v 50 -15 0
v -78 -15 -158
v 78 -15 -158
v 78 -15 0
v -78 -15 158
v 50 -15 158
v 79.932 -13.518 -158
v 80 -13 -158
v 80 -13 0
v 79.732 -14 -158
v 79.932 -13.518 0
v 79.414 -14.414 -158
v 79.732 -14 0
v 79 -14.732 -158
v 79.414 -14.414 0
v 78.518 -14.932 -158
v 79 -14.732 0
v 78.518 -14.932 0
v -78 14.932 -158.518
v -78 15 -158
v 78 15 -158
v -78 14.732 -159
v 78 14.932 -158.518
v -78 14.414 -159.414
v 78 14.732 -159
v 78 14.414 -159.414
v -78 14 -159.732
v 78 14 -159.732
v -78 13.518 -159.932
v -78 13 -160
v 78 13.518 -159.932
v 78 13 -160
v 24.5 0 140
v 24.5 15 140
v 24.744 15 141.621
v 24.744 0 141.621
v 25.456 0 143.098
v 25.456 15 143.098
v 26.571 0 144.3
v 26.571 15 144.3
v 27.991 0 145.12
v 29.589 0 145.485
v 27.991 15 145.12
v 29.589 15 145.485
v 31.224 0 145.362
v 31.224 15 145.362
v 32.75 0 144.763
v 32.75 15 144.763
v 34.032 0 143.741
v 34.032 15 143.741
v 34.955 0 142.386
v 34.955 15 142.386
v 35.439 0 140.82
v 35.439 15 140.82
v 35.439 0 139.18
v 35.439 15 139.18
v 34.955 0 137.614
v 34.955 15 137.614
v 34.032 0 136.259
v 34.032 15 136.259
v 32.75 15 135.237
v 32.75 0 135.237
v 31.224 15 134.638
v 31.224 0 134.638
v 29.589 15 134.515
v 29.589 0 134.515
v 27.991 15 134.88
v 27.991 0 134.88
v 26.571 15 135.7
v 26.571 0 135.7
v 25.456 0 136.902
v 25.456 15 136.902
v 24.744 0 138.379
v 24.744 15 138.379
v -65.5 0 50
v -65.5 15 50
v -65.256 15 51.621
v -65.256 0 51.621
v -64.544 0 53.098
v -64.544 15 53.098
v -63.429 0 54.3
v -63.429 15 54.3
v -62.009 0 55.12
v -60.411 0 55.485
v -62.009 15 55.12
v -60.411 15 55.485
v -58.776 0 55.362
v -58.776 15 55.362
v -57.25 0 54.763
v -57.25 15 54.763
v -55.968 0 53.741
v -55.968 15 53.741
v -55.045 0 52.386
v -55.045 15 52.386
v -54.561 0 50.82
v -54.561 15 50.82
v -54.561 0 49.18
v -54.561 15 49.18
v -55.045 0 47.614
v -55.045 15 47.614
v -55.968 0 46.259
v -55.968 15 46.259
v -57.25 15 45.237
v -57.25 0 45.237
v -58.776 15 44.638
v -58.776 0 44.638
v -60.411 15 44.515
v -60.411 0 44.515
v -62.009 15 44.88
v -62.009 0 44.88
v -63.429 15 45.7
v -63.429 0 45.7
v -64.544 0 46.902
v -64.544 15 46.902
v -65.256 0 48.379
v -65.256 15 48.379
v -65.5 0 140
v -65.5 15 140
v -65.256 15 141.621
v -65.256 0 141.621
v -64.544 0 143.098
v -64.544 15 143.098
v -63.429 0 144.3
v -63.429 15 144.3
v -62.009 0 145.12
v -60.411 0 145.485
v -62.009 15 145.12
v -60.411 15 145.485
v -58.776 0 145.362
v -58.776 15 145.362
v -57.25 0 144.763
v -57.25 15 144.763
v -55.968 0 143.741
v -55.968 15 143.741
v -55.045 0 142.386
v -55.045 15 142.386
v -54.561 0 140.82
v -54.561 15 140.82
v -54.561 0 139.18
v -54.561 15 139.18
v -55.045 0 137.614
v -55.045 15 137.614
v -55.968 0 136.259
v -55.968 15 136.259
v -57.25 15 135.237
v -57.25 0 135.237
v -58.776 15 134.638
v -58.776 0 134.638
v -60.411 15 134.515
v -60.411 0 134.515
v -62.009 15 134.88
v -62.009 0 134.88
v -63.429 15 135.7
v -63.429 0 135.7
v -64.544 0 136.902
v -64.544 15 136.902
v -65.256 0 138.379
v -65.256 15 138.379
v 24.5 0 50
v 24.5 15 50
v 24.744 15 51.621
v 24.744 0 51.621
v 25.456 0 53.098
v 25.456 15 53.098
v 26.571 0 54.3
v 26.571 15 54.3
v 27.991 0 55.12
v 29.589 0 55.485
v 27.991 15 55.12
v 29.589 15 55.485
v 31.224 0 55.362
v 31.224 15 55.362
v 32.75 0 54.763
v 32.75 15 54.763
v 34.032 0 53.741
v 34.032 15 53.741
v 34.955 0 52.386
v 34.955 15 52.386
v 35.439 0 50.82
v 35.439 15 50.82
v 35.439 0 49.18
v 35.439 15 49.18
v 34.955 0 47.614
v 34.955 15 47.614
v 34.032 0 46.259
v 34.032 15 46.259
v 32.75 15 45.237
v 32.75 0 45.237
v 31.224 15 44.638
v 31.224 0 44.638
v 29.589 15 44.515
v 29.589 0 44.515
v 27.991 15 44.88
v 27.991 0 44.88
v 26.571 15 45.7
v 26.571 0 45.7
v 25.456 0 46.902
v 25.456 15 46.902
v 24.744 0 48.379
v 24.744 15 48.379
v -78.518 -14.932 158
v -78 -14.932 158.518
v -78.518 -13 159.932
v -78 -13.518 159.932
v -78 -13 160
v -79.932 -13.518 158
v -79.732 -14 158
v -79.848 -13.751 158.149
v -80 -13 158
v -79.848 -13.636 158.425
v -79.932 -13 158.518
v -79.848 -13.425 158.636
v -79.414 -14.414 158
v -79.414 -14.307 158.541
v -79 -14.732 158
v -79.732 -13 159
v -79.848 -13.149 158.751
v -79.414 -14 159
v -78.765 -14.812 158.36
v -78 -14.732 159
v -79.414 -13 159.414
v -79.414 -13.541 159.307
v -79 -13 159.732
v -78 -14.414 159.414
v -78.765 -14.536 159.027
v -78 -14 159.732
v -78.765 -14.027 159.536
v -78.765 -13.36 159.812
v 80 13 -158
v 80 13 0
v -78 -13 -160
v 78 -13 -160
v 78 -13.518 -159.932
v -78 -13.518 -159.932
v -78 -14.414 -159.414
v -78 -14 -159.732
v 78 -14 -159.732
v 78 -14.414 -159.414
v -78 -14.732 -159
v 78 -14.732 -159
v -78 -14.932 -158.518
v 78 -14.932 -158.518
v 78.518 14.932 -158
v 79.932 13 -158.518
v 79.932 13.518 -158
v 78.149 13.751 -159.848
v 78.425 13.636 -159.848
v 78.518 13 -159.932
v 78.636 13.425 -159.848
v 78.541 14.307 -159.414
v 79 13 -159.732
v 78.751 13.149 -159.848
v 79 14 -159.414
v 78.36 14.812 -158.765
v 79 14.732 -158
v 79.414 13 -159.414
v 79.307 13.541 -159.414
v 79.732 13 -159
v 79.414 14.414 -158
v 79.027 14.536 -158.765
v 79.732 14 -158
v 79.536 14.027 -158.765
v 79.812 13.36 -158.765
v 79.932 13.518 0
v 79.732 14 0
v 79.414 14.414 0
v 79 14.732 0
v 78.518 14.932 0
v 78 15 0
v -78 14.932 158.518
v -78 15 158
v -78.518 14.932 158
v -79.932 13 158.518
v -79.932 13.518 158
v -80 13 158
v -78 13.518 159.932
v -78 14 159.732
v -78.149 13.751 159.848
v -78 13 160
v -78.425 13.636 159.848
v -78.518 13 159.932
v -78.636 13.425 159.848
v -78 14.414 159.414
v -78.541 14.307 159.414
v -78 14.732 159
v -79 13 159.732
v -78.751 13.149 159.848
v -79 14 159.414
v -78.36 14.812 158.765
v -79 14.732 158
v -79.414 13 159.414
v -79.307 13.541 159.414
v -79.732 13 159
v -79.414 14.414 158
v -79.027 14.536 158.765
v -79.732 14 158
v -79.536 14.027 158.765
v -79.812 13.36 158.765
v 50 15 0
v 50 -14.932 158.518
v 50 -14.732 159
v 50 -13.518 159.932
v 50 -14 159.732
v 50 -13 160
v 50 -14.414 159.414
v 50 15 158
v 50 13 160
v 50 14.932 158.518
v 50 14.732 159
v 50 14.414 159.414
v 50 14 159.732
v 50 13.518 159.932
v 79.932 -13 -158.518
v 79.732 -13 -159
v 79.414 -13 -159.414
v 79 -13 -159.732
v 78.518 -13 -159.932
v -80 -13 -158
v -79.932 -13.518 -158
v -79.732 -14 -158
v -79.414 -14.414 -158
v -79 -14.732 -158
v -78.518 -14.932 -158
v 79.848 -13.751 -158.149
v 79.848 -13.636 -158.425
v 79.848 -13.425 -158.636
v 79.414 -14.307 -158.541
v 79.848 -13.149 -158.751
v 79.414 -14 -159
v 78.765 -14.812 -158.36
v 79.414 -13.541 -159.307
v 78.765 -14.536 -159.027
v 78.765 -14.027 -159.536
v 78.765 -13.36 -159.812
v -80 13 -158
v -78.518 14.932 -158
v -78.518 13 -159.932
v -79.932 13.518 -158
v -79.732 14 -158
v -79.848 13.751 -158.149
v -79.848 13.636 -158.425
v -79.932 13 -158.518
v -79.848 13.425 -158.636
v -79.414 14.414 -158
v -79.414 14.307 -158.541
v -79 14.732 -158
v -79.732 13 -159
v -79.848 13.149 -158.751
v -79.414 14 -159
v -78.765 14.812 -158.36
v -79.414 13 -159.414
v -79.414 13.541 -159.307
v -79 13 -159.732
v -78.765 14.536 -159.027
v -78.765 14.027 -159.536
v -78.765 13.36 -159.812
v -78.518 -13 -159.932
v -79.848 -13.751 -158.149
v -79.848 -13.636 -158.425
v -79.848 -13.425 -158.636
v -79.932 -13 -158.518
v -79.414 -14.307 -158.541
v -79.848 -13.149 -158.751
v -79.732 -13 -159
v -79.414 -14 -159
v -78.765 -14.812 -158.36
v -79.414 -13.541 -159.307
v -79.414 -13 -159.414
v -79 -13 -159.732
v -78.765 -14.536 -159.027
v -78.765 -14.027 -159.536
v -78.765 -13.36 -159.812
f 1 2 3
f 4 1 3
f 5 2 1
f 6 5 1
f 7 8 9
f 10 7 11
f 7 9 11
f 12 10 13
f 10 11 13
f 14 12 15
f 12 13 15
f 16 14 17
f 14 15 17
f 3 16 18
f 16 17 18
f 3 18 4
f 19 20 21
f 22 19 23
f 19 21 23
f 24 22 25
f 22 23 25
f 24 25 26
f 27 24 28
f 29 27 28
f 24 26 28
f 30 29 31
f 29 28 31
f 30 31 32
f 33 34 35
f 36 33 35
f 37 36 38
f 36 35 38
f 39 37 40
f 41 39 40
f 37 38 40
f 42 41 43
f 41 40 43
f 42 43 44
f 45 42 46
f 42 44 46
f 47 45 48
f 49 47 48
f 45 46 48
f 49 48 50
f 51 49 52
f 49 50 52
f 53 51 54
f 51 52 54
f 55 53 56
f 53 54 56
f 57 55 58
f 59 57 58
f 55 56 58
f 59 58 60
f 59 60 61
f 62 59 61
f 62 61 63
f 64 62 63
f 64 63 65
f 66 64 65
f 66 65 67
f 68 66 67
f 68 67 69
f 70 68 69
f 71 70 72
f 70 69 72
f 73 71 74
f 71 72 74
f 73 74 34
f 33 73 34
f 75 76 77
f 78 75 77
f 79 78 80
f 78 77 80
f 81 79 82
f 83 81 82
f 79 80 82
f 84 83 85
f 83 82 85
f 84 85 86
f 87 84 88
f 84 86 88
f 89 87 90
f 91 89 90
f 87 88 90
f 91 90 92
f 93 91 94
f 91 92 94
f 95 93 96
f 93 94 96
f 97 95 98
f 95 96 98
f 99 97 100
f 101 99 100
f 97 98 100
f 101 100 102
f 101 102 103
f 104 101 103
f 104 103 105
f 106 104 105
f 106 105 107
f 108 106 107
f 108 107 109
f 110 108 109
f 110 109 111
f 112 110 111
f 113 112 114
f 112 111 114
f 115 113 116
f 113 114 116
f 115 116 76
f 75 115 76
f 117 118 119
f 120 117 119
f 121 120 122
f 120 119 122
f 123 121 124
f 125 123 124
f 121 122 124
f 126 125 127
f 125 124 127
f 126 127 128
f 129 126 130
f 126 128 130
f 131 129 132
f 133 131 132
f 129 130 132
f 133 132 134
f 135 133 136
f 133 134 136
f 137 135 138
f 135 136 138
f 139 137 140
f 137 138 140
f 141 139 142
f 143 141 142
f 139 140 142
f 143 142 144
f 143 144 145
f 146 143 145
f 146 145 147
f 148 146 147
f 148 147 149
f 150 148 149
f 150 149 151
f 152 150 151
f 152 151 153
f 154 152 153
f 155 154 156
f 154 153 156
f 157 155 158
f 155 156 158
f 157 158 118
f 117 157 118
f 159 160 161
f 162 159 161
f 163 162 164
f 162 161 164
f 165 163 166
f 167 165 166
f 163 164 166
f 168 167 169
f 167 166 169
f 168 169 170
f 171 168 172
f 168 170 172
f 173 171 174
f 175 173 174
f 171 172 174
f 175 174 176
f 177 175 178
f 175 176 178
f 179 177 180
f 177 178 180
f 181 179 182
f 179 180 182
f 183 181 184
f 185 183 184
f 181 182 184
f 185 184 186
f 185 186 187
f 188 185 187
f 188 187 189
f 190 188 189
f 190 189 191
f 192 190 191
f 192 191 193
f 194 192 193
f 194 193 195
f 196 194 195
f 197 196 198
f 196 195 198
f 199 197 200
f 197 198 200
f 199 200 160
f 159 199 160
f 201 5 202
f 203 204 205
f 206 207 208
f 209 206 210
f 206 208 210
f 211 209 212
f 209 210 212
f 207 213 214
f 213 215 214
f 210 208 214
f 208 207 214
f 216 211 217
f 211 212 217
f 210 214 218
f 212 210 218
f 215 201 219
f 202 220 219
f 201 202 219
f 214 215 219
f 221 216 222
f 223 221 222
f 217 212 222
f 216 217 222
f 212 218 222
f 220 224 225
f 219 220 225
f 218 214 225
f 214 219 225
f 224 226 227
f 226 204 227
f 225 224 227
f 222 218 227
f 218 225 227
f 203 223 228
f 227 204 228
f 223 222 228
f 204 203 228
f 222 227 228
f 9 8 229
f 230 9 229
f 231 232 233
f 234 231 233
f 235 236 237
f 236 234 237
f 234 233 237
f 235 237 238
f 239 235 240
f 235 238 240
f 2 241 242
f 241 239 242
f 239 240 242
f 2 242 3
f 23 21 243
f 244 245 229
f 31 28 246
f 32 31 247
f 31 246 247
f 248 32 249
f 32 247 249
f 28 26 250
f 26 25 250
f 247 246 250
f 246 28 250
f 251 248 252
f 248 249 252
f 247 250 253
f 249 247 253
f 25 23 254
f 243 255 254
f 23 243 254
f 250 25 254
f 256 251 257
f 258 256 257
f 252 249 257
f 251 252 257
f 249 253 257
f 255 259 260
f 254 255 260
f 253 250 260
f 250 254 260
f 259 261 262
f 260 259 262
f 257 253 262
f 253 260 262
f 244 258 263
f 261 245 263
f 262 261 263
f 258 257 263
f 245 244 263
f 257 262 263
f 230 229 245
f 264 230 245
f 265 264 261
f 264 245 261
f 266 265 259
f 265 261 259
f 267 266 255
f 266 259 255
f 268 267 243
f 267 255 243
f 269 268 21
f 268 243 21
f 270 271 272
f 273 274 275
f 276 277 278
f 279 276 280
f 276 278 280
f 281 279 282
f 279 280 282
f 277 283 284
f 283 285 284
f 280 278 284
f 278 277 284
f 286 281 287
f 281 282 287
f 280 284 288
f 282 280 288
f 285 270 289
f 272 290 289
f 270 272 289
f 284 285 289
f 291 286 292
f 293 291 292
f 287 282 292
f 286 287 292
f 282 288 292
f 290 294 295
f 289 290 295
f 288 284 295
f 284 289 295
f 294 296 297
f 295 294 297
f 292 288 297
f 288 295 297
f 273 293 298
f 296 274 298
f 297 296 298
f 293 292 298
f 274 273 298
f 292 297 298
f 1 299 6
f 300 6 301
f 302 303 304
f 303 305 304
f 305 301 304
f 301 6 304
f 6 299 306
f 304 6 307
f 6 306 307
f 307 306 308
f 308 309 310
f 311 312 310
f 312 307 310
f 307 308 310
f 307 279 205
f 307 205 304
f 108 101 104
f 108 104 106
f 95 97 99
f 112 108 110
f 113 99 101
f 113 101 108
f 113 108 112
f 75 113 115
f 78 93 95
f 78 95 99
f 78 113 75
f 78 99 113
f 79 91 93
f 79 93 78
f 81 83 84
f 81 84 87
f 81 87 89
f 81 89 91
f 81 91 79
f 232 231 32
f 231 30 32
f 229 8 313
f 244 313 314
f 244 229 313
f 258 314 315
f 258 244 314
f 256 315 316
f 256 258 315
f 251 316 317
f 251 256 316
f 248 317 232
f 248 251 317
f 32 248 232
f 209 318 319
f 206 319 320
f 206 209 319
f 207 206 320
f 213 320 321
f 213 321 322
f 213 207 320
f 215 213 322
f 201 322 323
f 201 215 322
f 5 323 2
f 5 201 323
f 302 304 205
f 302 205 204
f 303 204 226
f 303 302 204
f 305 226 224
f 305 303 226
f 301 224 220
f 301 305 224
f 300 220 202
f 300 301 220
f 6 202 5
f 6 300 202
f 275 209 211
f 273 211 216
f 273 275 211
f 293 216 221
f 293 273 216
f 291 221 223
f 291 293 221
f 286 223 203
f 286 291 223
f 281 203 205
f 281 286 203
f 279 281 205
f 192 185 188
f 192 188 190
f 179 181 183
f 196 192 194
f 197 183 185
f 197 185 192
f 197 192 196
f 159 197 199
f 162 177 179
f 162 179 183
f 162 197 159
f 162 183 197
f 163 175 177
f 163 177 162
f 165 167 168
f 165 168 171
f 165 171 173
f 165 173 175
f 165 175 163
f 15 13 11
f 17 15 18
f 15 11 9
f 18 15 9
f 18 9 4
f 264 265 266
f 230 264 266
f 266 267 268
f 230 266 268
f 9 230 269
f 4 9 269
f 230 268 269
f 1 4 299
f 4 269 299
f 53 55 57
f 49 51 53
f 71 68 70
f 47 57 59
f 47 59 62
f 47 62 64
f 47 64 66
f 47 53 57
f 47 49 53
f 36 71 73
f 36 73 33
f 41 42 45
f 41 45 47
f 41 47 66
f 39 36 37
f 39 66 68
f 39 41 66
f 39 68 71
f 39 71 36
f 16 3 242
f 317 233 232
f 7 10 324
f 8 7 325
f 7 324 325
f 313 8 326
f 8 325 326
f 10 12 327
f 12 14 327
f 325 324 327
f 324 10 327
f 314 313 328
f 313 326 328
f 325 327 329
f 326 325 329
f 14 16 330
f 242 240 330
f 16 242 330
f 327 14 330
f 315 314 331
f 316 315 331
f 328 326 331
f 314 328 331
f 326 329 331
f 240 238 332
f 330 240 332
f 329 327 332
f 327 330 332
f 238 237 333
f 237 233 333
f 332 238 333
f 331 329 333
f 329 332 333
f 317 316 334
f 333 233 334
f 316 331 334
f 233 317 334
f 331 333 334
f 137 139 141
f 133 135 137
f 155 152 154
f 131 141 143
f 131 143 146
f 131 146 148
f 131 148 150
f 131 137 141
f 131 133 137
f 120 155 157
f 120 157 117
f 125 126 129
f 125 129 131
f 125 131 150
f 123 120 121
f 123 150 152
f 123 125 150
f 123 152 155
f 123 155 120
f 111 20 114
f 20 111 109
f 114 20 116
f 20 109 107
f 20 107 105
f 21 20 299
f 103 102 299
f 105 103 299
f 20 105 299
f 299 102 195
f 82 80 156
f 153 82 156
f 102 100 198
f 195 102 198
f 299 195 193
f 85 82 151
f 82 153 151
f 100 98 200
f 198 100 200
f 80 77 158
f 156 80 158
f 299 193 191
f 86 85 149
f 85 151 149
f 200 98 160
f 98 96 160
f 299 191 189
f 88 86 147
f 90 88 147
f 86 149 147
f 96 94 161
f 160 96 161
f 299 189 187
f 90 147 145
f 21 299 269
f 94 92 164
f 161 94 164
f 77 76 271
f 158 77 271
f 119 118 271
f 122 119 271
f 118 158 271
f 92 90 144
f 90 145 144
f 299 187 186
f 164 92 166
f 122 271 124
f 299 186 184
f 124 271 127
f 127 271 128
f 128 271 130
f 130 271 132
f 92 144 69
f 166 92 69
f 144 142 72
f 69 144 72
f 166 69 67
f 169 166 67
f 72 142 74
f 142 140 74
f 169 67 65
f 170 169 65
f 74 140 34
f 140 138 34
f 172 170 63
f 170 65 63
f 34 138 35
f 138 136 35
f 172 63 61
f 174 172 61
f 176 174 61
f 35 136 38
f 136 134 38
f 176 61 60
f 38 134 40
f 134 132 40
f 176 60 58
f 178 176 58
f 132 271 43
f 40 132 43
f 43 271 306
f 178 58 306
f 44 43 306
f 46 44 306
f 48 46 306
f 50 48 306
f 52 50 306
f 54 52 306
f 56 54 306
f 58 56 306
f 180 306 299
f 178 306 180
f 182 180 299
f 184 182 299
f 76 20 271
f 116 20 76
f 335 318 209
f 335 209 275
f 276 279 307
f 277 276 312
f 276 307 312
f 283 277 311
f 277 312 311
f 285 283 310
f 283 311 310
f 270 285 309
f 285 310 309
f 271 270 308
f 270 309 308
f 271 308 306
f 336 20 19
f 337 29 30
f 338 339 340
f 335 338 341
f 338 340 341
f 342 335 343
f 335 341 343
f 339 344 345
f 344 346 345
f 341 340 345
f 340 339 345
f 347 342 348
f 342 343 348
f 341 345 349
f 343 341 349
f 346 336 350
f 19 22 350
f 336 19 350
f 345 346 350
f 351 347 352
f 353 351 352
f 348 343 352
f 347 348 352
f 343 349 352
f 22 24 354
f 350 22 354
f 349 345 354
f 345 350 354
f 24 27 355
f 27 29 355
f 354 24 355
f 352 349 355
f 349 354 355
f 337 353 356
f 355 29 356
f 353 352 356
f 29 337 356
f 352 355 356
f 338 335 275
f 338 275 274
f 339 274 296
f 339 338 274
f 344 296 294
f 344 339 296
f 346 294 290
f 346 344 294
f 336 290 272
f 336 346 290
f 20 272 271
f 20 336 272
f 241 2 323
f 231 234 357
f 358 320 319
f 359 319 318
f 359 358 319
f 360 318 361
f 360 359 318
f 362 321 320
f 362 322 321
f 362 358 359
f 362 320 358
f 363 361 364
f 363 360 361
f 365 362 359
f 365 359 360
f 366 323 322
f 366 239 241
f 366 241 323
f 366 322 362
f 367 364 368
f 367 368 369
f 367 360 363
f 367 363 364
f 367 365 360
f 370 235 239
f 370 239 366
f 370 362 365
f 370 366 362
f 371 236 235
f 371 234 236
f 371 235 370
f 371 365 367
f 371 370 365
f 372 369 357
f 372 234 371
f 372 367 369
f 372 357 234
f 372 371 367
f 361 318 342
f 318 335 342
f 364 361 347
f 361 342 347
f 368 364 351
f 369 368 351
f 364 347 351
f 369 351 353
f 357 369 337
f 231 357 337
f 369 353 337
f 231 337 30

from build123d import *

# Parameters (mm, degrees)
F0_W     = 160
F0_H     = 30
F1_DEPTH = 160
F2_R     = 2
F3_W     = 28
F3_H     = 158
F4_DEPTH = 30.001
F3_R     = 5.5
F5_DEPTH = 15


with BuildPart() as f1:
    # F0 (on Top) → F1 (new body, symmetric)
    with BuildSketch(Plane.XY):
        Rectangle(F0_W, F0_H)
    extrude(amount=F1_DEPTH, both=True)

    # F2
    f2_edges = [f1.edges().sort_by_distance(p)[0] for p in [
        (0, -15, -160),
        (80, -15, 0),
        (0, -15, 160),
        (-80, -15, 0),
        (80, 15, 0),
        (0, 15, -160),
        (-80, 15, 0),
        (0, 15, 160),
        (80, 0, 160),
        (-80, 0, 160),
        (80, 0, -160),
        (-80, 0, -160),
    ]]
    fillet(f2_edges, radius=F2_R)

    # F3 (on face) → F4 (cut, through all)
    with BuildSketch(Plane(origin=(0, 15, 0), x_dir=(-1, 0, 0), z_dir=(0, 1, 0))):
        with Locations((-64, 79)):
            Rectangle(F3_W, F3_H)
        Polygon((-80, 0), (-78, 0), (-78, 158), (-50, 158), (-50, 160), (-80, 160), align=None)
    extrude(amount=-F4_DEPTH, mode=Mode.SUBTRACT)

    # F3 (on face) → F5 (cut)
    with BuildSketch(Plane(origin=(0, 15, 0), x_dir=(-1, 0, 0), z_dir=(0, 1, 0))):
        with Locations((60, 140)):
            Circle(F3_R)
        with Locations((-30, 140)):
            Circle(F3_R)
        with Locations((-30, 50)):
            Circle(F3_R)
        with Locations((60, 50)):
            Circle(F3_R)
    extrude(amount=-F5_DEPTH, mode=Mode.SUBTRACT)


solid = f1.part
